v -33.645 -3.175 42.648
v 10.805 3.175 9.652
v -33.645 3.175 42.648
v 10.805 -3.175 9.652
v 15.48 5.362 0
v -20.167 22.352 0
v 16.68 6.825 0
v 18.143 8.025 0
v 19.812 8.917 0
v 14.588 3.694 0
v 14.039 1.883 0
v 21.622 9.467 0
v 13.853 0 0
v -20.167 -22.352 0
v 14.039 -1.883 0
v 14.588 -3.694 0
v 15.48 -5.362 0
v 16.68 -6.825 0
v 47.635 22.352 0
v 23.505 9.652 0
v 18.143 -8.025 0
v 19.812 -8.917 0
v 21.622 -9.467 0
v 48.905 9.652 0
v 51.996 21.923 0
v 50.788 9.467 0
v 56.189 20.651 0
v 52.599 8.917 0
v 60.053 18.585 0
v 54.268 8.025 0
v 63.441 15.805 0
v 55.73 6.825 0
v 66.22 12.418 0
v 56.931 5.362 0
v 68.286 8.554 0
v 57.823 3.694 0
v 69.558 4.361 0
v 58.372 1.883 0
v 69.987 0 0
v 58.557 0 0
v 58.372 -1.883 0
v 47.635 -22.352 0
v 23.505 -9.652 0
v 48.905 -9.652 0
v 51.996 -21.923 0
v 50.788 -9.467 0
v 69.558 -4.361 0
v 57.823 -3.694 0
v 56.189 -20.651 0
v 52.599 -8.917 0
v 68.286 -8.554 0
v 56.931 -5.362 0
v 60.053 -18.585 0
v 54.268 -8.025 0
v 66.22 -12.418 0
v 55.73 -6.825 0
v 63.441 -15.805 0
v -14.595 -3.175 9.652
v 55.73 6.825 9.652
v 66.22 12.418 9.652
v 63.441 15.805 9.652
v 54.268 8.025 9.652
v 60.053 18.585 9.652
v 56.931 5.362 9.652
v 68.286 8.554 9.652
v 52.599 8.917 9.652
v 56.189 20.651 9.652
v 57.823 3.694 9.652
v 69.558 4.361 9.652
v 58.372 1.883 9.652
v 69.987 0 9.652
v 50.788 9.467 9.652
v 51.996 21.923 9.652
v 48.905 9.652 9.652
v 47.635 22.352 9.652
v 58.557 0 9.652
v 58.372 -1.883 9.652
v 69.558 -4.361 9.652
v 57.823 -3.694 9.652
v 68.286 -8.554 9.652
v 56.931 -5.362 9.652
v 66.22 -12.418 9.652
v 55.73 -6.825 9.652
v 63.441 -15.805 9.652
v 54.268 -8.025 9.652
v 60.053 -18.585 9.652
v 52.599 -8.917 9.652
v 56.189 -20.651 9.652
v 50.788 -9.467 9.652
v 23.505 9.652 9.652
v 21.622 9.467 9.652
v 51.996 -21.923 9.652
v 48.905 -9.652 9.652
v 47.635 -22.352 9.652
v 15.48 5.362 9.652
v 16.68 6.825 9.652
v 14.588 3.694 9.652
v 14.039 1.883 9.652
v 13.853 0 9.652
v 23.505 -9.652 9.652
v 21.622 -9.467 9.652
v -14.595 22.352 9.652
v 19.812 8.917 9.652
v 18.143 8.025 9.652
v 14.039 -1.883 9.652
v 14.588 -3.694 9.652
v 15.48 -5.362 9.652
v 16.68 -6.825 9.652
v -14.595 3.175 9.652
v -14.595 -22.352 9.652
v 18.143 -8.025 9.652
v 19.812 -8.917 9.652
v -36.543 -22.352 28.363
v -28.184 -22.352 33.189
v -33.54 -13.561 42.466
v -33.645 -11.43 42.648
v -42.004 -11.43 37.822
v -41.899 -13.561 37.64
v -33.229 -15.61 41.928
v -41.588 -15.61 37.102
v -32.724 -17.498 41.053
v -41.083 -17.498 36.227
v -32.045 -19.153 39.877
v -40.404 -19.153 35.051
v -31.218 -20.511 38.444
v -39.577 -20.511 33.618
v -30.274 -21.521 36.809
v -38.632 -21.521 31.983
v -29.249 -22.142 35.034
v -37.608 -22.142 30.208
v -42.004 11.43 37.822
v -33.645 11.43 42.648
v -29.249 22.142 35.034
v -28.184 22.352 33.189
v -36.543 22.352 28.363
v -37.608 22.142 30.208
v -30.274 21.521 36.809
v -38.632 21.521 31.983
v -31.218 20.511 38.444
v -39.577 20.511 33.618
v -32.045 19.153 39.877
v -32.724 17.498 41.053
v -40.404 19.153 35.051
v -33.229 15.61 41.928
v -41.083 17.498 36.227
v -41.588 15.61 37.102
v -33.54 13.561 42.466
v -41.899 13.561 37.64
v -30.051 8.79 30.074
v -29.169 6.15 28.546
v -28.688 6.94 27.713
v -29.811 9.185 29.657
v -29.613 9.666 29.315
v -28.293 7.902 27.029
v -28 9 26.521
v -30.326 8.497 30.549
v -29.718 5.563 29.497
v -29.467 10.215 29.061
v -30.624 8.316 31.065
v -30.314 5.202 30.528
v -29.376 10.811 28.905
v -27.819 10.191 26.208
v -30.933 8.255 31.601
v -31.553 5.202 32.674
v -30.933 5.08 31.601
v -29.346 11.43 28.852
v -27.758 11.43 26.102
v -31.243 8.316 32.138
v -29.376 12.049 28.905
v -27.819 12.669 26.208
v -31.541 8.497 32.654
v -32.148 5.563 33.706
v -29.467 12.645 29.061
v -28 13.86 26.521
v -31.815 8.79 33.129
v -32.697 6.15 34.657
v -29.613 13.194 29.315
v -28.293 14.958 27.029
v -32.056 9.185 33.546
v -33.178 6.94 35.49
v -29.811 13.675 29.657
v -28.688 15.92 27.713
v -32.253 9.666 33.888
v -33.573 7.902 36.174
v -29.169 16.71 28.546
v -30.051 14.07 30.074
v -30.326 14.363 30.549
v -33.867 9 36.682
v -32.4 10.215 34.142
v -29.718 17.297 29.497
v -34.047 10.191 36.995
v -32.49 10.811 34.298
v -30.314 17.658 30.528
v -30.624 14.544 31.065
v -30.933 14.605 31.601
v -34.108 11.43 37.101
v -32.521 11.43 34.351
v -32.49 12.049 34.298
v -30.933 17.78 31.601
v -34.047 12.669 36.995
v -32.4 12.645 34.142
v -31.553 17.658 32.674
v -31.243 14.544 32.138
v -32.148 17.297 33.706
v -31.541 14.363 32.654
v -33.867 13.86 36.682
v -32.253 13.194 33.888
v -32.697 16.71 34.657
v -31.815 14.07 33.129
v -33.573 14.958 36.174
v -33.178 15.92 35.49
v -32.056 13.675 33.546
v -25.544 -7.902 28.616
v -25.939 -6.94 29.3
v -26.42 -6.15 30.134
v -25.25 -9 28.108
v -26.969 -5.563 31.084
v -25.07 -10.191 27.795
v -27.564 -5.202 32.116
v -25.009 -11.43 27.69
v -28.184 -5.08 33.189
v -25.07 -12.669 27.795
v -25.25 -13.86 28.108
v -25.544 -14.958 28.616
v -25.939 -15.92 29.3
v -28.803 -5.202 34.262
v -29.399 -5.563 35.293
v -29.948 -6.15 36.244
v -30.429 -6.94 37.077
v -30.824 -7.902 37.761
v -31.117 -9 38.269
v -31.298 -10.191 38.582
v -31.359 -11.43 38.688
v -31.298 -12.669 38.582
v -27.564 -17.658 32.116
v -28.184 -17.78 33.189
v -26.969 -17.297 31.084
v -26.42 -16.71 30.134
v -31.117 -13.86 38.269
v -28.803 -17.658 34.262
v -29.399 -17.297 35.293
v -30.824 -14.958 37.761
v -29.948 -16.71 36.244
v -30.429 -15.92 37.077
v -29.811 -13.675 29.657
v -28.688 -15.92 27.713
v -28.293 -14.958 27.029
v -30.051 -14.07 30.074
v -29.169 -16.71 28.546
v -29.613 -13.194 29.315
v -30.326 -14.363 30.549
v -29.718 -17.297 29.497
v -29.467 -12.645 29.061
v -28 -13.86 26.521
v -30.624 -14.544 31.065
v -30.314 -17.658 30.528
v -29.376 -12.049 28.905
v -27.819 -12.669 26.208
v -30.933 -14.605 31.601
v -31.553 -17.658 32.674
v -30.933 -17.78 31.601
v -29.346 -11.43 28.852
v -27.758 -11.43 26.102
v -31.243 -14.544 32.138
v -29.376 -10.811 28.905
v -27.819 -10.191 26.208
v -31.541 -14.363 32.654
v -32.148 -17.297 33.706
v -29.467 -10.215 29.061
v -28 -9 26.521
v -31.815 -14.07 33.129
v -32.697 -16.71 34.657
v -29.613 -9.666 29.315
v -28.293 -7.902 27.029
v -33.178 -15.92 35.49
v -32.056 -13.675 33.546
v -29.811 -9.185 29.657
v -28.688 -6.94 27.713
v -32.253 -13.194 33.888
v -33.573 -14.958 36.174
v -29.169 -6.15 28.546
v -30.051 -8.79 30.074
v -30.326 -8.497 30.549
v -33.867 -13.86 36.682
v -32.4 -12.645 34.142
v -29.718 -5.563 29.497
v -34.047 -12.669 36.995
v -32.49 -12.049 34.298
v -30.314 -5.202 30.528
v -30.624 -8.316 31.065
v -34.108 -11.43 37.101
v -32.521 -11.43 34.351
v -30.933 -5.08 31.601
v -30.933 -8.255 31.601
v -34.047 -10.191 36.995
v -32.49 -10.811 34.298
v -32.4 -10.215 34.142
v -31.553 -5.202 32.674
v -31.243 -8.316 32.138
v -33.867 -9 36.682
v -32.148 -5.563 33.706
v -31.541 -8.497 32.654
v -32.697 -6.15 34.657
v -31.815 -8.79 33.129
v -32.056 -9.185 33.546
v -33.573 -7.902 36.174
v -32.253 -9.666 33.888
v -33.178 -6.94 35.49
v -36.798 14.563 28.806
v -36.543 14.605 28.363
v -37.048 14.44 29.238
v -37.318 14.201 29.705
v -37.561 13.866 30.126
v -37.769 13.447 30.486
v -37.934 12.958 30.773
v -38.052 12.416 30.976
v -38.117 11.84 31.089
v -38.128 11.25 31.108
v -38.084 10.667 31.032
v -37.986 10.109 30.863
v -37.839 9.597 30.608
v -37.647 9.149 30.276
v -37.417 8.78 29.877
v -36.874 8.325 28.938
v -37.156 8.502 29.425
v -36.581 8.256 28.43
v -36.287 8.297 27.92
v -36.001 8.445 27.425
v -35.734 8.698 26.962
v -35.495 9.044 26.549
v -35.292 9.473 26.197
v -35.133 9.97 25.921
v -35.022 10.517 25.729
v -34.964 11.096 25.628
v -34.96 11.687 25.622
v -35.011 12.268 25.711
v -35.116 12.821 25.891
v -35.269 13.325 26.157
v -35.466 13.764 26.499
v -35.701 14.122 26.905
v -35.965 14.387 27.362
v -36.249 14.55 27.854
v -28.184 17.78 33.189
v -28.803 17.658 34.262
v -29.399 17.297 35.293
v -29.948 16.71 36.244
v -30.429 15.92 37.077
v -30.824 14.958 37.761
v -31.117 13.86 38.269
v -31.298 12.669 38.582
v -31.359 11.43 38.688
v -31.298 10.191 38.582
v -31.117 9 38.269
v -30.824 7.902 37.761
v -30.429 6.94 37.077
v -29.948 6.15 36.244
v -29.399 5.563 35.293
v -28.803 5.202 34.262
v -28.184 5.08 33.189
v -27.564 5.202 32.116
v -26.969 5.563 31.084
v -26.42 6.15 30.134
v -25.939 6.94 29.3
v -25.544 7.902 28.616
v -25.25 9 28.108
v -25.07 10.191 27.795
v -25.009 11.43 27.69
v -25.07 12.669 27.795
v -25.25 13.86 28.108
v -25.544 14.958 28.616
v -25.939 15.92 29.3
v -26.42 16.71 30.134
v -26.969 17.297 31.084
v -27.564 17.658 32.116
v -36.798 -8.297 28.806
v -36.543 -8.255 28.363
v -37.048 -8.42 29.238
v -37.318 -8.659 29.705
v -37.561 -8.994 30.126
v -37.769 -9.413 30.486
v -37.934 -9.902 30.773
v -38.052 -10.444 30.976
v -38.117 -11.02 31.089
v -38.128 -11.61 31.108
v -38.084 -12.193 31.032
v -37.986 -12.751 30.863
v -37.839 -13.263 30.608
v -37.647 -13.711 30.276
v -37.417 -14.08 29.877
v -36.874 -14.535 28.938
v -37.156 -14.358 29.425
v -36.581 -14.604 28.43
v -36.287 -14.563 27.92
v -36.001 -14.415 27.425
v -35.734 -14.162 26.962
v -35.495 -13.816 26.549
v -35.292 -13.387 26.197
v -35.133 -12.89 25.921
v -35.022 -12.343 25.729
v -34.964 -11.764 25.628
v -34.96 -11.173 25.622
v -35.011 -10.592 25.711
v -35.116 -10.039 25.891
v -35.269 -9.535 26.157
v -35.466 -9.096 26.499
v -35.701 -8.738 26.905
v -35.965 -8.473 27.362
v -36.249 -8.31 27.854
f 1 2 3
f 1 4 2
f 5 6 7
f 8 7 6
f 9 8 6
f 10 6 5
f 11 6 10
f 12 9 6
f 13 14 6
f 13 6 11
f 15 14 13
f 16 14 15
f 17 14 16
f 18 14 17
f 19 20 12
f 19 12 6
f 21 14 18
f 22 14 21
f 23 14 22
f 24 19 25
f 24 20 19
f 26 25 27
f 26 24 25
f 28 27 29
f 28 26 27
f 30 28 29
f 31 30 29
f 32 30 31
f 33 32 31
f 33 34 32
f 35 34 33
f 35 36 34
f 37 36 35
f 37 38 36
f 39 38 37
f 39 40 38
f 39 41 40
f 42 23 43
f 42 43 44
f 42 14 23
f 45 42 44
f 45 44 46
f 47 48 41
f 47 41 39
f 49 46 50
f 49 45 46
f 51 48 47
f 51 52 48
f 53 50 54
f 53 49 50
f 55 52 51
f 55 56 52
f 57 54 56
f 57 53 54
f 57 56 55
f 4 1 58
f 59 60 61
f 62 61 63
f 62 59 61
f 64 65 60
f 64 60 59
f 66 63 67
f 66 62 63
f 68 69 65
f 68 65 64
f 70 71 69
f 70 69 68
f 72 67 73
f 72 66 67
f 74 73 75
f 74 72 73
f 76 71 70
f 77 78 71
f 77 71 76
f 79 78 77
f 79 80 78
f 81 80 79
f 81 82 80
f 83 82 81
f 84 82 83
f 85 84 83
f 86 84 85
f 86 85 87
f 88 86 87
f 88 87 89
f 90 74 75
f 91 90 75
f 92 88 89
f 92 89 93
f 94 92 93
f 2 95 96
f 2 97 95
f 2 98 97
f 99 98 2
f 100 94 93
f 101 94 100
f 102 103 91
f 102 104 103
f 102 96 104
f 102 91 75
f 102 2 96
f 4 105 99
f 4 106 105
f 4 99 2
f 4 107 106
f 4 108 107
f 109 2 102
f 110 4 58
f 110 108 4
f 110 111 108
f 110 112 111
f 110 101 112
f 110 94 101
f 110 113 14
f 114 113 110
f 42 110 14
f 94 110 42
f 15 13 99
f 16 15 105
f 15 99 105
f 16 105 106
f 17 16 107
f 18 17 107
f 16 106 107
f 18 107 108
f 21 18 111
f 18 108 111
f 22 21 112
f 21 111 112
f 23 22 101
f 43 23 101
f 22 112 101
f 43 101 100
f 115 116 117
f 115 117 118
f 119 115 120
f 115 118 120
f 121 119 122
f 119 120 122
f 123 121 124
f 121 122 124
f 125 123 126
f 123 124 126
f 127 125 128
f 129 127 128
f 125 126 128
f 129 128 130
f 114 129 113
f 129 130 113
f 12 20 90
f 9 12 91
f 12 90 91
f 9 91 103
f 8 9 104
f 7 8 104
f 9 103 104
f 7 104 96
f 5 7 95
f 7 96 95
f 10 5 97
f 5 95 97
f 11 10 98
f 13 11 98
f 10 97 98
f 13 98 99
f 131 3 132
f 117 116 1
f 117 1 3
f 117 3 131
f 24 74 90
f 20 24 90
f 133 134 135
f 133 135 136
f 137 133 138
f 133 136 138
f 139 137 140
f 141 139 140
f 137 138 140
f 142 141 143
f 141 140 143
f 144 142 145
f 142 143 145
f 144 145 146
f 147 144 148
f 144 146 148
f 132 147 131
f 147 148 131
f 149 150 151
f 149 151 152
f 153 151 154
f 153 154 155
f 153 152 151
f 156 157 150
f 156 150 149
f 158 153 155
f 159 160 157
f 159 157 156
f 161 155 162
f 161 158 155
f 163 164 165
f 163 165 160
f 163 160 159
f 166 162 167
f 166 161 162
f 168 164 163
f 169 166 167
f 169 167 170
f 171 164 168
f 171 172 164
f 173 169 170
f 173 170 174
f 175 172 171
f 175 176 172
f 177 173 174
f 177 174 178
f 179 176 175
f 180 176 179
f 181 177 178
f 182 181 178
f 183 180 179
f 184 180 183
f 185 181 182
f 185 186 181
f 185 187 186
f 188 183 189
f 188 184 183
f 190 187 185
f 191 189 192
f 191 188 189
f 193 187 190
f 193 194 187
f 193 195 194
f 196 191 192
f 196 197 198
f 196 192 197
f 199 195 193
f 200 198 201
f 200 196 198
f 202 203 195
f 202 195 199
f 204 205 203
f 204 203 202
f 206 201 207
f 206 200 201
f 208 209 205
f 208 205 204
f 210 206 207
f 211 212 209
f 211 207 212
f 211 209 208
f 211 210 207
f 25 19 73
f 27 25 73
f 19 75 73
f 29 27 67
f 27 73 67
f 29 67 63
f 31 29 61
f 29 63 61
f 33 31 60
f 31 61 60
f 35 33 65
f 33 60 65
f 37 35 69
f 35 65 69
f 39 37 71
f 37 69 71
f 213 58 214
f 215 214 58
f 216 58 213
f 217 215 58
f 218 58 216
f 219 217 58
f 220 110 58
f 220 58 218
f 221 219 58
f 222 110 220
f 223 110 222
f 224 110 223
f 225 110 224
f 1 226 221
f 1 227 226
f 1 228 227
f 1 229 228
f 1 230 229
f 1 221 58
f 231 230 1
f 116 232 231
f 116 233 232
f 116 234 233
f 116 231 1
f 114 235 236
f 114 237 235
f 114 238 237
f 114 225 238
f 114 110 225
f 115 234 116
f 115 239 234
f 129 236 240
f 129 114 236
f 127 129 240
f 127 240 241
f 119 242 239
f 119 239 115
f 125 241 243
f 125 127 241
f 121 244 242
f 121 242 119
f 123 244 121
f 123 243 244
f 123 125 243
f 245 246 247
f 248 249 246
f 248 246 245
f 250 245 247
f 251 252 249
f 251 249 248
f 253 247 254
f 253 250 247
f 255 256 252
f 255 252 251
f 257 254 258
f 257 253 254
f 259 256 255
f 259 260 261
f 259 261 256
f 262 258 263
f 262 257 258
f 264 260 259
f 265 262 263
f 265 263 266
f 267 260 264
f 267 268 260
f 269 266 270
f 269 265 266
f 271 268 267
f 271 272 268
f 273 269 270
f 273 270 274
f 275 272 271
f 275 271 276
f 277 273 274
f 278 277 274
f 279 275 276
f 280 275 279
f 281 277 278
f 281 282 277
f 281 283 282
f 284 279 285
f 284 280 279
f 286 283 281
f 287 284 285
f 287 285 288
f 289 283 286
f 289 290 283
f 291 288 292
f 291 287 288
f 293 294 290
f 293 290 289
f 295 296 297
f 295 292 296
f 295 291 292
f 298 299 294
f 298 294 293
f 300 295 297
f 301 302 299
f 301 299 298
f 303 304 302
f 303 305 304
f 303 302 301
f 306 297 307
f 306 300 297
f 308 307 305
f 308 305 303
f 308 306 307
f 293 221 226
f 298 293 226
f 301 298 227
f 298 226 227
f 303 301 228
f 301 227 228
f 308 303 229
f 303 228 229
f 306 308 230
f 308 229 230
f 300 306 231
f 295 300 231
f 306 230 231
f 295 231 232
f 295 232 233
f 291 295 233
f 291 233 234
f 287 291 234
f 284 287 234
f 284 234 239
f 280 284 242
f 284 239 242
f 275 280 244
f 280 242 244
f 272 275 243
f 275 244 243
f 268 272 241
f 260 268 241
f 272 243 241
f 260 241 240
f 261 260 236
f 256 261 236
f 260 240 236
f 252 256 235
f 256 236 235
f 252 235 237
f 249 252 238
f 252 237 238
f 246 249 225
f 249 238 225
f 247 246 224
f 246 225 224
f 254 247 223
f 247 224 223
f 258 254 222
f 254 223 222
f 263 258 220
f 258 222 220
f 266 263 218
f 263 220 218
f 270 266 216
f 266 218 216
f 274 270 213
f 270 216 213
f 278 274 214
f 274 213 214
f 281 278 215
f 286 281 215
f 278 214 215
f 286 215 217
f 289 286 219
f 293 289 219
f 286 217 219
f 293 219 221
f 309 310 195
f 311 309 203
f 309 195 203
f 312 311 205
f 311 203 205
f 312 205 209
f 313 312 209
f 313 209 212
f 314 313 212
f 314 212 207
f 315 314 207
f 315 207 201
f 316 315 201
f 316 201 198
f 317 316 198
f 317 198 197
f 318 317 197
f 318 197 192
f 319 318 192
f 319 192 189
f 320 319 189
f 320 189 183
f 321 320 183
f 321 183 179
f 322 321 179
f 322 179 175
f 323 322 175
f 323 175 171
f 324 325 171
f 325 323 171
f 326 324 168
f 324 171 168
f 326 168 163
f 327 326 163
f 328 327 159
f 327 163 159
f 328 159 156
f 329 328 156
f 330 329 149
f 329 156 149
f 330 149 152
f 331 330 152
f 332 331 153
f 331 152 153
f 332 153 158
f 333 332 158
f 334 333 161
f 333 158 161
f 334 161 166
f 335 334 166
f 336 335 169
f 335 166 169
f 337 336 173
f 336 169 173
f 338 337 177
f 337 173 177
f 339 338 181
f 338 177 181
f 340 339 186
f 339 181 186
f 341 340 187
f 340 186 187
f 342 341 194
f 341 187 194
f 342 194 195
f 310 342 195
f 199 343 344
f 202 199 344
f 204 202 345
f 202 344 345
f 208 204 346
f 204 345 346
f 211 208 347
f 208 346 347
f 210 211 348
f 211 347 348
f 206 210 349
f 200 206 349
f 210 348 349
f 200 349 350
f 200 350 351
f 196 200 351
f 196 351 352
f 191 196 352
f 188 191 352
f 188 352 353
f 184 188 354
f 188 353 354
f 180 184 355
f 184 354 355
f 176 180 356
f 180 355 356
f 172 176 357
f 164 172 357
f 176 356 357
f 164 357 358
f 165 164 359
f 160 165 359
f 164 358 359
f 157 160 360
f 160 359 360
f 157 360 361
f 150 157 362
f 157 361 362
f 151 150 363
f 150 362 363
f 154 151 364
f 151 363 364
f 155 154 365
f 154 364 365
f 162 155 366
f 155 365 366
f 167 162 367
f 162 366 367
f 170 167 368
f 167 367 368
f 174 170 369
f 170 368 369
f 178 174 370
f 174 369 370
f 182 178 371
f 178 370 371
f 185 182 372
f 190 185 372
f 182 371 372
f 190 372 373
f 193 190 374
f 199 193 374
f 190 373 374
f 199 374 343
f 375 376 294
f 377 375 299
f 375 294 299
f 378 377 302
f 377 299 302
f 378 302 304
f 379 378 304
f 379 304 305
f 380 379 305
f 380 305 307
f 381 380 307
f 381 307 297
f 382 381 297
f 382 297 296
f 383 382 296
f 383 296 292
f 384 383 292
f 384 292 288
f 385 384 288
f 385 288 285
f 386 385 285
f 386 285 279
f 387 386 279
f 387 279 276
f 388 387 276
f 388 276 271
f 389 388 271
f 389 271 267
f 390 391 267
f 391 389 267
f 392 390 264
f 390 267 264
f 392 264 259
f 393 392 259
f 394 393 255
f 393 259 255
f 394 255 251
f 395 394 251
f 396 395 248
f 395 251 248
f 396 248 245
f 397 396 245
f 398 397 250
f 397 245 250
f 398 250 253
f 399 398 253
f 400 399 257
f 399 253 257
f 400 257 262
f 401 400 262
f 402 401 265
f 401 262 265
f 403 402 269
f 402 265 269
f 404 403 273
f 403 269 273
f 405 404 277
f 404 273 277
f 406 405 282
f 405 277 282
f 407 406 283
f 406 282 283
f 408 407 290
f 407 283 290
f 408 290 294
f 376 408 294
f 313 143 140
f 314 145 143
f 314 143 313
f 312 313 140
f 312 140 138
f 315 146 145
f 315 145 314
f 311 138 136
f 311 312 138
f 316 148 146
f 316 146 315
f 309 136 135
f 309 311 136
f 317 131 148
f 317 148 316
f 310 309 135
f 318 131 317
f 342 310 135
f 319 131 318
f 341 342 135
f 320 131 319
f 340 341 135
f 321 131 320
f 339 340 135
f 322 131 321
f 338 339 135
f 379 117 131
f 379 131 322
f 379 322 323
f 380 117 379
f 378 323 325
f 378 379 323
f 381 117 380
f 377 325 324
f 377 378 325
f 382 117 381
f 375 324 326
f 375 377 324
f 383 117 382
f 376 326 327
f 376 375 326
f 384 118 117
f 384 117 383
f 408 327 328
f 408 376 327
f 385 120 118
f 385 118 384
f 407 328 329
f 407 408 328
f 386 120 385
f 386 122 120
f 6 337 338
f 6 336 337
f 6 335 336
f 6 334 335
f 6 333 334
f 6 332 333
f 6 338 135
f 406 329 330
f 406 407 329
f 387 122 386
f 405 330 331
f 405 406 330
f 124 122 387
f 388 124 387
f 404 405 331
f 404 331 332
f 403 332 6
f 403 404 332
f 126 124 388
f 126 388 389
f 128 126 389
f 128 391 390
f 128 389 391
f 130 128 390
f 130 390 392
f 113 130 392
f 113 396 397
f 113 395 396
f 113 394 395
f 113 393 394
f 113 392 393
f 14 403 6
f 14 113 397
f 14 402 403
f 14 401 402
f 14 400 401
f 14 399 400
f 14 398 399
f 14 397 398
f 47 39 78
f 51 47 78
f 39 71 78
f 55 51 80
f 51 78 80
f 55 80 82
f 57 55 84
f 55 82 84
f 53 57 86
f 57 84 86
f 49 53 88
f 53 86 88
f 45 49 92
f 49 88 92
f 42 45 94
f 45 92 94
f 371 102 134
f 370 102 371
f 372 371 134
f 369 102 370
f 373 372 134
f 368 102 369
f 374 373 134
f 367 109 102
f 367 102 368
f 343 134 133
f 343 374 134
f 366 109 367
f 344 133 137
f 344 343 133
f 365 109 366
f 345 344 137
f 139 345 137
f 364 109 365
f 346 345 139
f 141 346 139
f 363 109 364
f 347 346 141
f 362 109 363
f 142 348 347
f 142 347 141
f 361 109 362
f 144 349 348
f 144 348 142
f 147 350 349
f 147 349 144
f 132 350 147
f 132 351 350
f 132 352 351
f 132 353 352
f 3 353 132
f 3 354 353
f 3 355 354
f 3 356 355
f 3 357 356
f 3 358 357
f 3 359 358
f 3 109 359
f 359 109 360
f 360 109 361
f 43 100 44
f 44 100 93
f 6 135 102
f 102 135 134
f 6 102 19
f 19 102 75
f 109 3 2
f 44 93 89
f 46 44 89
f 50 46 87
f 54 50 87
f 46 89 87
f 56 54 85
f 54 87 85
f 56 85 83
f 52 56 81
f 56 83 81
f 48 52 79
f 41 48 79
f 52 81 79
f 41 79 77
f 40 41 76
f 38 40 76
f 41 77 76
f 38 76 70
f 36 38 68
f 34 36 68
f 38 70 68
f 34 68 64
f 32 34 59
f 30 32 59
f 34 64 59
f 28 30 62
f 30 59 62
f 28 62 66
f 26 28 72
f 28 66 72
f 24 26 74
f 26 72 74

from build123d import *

# Parameters (mm, degrees)
F1_DEPTH  = 22.352
F2_DEPTH  = 3.175
F4_DEPTH  = 1143
F6_R      = 6.35
F6_R_2    = 3.175
F7_DEPTH  = 3.175
F8_R      = 6.35
F8_R_2    = 3.175
F9_DEPTH  = 3.175
F10_DEPTH = 28.5637839421
F11_R     = 10.922
F12_R     = 22.35199


# Not quite as in the source:
# - a fillet or chamfer is up to 0.001 mm smaller than in the source, because OpenCascade refuses the exact size


with BuildPart() as f1:
    # F0 (on Front) → F1 (new body, symmetric)
    with BuildSketch(Plane.XZ):
        Polygon((-14.5947370299, 9.652), (-33.6447370299, 42.6475678842), (-42.0036142272, 37.8215678842), (-20.1673218281, 0), (69.9872629701, 0), (69.9872629701, 9.652), (10.8052629701, 9.652), align=None)
    extrude(amount=F1_DEPTH, both=True)

    # F0 (on Front) → F2 (join, symmetric)
    with BuildSketch(Plane.XZ):
        Polygon((10.8052629701, 9.652), (-33.6447370299, 42.6475678842), (-14.5947370299, 9.652), align=None)
    extrude(amount=F2_DEPTH, both=True)

    # F3 (on face) → F4 (cut)
    with BuildSketch(Plane.XY.offset(9.652)):
        with BuildLine():
            ThreePointArc((23.5052629701, 9.652), (16.6802683181, 6.824994652), (13.8532629701, 0))
            Line((13.8532629701, 0), (23.5052629701, 0))
            Line((23.5052629701, 0), (26.5532629701, 0))
            ThreePointArc((26.5532629701, 0), (27.1079902762, 4.9488187589), (28.7446379798, 9.652))
            Line((28.7446379798, 9.652), (23.5052629701, 9.652))
        make_face()
        with BuildLine():
            Line((23.5052629701, 0), (13.8532629701, 0))
            ThreePointArc((13.8532629701, 0), (16.6802683181, -6.824994652), (23.5052629701, -9.652))
            Line((23.5052629701, -9.652), (28.7446379798, -9.652))
            ThreePointArc((28.7446379798, -9.652), (27.1079902762, -4.9488187589), (26.5532629701, 0))
            Line((26.5532629701, 0), (23.5052629701, 0))
        make_face()
        with BuildLine():
            ThreePointArc((28.7446379798, 9.652), (27.1079902762, 4.9488187589), (26.5532629701, 0))
            ThreePointArc((26.5532629701, 0), (27.1079902762, -4.9488187589), (28.7446379798, -9.652))
            Line((28.7446379798, -9.652), (48.9052629701, -9.652))
            ThreePointArc((48.9052629701, -9.652), (58.5572629701, 0), (48.9052629701, 9.652))
            Line((48.9052629701, 9.652), (28.7446379798, 9.652))
        make_face()
    extrude(amount=-F4_DEPTH, mode=Mode.SUBTRACT)

    # F6 (on face) → F7 (cut)
    with BuildSketch(Plane(origin=(-6.7666141738, 0, -3.9067065147), x_dir=(0, 1, 0), z_dir=(0.8660254038, 0, 0.5))):
        with Locations((11.43, 42.8342457123)):
            Circle(F6_R)
        with Locations((11.43, 42.8342457123)):
            Circle(F6_R_2, mode=Mode.SUBTRACT)
    extrude(amount=-F7_DEPTH, mode=Mode.SUBTRACT)

    # F8 (on face) → F9 (cut)
    with BuildSketch(Plane(origin=(-6.7666141738, 0, -3.9067065147), x_dir=(0, 1, 0), z_dir=(0.8660254038, 0, 0.5))):
        with Locations((-11.43, 42.8342457123)):
            Circle(F8_R)
        with Locations((-11.43, 42.8342457123)):
            Circle(F8_R_2, mode=Mode.SUBTRACT)
    extrude(amount=-F9_DEPTH, mode=Mode.SUBTRACT)

    # F10 (cut, through all): faces of the model
    f10_faces = [f1.faces().sort_by_distance(p)[0] for p in [
        (-28.1837370299, -11.43, 33.1888384241),
        (-28.1837370299, 11.43, 33.1888384241),
    ]]
    extrude(f10_faces, amount=-F10_DEPTH, mode=Mode.SUBTRACT)

    # F11
    f11_edges = [f1.edges().sort_by_distance(p)[0] for p in [
        (-37.824176, -22.352, 40.234568),
        (-37.824176, 22.352, 40.234568),
    ]]
    fillet(f11_edges, radius=F11_R)

    # F12 (radius 22.352 in the source; OpenCascade refuses exactly that, so slightly less here)
    f12_edges = [f1.edges().sort_by_distance(p)[0] for p in [
        (69.987263, 22.352, 4.826),
        (69.987263, -22.352, 4.826),
    ]]
    fillet(f12_edges, radius=F12_R)


solid = f1.part
